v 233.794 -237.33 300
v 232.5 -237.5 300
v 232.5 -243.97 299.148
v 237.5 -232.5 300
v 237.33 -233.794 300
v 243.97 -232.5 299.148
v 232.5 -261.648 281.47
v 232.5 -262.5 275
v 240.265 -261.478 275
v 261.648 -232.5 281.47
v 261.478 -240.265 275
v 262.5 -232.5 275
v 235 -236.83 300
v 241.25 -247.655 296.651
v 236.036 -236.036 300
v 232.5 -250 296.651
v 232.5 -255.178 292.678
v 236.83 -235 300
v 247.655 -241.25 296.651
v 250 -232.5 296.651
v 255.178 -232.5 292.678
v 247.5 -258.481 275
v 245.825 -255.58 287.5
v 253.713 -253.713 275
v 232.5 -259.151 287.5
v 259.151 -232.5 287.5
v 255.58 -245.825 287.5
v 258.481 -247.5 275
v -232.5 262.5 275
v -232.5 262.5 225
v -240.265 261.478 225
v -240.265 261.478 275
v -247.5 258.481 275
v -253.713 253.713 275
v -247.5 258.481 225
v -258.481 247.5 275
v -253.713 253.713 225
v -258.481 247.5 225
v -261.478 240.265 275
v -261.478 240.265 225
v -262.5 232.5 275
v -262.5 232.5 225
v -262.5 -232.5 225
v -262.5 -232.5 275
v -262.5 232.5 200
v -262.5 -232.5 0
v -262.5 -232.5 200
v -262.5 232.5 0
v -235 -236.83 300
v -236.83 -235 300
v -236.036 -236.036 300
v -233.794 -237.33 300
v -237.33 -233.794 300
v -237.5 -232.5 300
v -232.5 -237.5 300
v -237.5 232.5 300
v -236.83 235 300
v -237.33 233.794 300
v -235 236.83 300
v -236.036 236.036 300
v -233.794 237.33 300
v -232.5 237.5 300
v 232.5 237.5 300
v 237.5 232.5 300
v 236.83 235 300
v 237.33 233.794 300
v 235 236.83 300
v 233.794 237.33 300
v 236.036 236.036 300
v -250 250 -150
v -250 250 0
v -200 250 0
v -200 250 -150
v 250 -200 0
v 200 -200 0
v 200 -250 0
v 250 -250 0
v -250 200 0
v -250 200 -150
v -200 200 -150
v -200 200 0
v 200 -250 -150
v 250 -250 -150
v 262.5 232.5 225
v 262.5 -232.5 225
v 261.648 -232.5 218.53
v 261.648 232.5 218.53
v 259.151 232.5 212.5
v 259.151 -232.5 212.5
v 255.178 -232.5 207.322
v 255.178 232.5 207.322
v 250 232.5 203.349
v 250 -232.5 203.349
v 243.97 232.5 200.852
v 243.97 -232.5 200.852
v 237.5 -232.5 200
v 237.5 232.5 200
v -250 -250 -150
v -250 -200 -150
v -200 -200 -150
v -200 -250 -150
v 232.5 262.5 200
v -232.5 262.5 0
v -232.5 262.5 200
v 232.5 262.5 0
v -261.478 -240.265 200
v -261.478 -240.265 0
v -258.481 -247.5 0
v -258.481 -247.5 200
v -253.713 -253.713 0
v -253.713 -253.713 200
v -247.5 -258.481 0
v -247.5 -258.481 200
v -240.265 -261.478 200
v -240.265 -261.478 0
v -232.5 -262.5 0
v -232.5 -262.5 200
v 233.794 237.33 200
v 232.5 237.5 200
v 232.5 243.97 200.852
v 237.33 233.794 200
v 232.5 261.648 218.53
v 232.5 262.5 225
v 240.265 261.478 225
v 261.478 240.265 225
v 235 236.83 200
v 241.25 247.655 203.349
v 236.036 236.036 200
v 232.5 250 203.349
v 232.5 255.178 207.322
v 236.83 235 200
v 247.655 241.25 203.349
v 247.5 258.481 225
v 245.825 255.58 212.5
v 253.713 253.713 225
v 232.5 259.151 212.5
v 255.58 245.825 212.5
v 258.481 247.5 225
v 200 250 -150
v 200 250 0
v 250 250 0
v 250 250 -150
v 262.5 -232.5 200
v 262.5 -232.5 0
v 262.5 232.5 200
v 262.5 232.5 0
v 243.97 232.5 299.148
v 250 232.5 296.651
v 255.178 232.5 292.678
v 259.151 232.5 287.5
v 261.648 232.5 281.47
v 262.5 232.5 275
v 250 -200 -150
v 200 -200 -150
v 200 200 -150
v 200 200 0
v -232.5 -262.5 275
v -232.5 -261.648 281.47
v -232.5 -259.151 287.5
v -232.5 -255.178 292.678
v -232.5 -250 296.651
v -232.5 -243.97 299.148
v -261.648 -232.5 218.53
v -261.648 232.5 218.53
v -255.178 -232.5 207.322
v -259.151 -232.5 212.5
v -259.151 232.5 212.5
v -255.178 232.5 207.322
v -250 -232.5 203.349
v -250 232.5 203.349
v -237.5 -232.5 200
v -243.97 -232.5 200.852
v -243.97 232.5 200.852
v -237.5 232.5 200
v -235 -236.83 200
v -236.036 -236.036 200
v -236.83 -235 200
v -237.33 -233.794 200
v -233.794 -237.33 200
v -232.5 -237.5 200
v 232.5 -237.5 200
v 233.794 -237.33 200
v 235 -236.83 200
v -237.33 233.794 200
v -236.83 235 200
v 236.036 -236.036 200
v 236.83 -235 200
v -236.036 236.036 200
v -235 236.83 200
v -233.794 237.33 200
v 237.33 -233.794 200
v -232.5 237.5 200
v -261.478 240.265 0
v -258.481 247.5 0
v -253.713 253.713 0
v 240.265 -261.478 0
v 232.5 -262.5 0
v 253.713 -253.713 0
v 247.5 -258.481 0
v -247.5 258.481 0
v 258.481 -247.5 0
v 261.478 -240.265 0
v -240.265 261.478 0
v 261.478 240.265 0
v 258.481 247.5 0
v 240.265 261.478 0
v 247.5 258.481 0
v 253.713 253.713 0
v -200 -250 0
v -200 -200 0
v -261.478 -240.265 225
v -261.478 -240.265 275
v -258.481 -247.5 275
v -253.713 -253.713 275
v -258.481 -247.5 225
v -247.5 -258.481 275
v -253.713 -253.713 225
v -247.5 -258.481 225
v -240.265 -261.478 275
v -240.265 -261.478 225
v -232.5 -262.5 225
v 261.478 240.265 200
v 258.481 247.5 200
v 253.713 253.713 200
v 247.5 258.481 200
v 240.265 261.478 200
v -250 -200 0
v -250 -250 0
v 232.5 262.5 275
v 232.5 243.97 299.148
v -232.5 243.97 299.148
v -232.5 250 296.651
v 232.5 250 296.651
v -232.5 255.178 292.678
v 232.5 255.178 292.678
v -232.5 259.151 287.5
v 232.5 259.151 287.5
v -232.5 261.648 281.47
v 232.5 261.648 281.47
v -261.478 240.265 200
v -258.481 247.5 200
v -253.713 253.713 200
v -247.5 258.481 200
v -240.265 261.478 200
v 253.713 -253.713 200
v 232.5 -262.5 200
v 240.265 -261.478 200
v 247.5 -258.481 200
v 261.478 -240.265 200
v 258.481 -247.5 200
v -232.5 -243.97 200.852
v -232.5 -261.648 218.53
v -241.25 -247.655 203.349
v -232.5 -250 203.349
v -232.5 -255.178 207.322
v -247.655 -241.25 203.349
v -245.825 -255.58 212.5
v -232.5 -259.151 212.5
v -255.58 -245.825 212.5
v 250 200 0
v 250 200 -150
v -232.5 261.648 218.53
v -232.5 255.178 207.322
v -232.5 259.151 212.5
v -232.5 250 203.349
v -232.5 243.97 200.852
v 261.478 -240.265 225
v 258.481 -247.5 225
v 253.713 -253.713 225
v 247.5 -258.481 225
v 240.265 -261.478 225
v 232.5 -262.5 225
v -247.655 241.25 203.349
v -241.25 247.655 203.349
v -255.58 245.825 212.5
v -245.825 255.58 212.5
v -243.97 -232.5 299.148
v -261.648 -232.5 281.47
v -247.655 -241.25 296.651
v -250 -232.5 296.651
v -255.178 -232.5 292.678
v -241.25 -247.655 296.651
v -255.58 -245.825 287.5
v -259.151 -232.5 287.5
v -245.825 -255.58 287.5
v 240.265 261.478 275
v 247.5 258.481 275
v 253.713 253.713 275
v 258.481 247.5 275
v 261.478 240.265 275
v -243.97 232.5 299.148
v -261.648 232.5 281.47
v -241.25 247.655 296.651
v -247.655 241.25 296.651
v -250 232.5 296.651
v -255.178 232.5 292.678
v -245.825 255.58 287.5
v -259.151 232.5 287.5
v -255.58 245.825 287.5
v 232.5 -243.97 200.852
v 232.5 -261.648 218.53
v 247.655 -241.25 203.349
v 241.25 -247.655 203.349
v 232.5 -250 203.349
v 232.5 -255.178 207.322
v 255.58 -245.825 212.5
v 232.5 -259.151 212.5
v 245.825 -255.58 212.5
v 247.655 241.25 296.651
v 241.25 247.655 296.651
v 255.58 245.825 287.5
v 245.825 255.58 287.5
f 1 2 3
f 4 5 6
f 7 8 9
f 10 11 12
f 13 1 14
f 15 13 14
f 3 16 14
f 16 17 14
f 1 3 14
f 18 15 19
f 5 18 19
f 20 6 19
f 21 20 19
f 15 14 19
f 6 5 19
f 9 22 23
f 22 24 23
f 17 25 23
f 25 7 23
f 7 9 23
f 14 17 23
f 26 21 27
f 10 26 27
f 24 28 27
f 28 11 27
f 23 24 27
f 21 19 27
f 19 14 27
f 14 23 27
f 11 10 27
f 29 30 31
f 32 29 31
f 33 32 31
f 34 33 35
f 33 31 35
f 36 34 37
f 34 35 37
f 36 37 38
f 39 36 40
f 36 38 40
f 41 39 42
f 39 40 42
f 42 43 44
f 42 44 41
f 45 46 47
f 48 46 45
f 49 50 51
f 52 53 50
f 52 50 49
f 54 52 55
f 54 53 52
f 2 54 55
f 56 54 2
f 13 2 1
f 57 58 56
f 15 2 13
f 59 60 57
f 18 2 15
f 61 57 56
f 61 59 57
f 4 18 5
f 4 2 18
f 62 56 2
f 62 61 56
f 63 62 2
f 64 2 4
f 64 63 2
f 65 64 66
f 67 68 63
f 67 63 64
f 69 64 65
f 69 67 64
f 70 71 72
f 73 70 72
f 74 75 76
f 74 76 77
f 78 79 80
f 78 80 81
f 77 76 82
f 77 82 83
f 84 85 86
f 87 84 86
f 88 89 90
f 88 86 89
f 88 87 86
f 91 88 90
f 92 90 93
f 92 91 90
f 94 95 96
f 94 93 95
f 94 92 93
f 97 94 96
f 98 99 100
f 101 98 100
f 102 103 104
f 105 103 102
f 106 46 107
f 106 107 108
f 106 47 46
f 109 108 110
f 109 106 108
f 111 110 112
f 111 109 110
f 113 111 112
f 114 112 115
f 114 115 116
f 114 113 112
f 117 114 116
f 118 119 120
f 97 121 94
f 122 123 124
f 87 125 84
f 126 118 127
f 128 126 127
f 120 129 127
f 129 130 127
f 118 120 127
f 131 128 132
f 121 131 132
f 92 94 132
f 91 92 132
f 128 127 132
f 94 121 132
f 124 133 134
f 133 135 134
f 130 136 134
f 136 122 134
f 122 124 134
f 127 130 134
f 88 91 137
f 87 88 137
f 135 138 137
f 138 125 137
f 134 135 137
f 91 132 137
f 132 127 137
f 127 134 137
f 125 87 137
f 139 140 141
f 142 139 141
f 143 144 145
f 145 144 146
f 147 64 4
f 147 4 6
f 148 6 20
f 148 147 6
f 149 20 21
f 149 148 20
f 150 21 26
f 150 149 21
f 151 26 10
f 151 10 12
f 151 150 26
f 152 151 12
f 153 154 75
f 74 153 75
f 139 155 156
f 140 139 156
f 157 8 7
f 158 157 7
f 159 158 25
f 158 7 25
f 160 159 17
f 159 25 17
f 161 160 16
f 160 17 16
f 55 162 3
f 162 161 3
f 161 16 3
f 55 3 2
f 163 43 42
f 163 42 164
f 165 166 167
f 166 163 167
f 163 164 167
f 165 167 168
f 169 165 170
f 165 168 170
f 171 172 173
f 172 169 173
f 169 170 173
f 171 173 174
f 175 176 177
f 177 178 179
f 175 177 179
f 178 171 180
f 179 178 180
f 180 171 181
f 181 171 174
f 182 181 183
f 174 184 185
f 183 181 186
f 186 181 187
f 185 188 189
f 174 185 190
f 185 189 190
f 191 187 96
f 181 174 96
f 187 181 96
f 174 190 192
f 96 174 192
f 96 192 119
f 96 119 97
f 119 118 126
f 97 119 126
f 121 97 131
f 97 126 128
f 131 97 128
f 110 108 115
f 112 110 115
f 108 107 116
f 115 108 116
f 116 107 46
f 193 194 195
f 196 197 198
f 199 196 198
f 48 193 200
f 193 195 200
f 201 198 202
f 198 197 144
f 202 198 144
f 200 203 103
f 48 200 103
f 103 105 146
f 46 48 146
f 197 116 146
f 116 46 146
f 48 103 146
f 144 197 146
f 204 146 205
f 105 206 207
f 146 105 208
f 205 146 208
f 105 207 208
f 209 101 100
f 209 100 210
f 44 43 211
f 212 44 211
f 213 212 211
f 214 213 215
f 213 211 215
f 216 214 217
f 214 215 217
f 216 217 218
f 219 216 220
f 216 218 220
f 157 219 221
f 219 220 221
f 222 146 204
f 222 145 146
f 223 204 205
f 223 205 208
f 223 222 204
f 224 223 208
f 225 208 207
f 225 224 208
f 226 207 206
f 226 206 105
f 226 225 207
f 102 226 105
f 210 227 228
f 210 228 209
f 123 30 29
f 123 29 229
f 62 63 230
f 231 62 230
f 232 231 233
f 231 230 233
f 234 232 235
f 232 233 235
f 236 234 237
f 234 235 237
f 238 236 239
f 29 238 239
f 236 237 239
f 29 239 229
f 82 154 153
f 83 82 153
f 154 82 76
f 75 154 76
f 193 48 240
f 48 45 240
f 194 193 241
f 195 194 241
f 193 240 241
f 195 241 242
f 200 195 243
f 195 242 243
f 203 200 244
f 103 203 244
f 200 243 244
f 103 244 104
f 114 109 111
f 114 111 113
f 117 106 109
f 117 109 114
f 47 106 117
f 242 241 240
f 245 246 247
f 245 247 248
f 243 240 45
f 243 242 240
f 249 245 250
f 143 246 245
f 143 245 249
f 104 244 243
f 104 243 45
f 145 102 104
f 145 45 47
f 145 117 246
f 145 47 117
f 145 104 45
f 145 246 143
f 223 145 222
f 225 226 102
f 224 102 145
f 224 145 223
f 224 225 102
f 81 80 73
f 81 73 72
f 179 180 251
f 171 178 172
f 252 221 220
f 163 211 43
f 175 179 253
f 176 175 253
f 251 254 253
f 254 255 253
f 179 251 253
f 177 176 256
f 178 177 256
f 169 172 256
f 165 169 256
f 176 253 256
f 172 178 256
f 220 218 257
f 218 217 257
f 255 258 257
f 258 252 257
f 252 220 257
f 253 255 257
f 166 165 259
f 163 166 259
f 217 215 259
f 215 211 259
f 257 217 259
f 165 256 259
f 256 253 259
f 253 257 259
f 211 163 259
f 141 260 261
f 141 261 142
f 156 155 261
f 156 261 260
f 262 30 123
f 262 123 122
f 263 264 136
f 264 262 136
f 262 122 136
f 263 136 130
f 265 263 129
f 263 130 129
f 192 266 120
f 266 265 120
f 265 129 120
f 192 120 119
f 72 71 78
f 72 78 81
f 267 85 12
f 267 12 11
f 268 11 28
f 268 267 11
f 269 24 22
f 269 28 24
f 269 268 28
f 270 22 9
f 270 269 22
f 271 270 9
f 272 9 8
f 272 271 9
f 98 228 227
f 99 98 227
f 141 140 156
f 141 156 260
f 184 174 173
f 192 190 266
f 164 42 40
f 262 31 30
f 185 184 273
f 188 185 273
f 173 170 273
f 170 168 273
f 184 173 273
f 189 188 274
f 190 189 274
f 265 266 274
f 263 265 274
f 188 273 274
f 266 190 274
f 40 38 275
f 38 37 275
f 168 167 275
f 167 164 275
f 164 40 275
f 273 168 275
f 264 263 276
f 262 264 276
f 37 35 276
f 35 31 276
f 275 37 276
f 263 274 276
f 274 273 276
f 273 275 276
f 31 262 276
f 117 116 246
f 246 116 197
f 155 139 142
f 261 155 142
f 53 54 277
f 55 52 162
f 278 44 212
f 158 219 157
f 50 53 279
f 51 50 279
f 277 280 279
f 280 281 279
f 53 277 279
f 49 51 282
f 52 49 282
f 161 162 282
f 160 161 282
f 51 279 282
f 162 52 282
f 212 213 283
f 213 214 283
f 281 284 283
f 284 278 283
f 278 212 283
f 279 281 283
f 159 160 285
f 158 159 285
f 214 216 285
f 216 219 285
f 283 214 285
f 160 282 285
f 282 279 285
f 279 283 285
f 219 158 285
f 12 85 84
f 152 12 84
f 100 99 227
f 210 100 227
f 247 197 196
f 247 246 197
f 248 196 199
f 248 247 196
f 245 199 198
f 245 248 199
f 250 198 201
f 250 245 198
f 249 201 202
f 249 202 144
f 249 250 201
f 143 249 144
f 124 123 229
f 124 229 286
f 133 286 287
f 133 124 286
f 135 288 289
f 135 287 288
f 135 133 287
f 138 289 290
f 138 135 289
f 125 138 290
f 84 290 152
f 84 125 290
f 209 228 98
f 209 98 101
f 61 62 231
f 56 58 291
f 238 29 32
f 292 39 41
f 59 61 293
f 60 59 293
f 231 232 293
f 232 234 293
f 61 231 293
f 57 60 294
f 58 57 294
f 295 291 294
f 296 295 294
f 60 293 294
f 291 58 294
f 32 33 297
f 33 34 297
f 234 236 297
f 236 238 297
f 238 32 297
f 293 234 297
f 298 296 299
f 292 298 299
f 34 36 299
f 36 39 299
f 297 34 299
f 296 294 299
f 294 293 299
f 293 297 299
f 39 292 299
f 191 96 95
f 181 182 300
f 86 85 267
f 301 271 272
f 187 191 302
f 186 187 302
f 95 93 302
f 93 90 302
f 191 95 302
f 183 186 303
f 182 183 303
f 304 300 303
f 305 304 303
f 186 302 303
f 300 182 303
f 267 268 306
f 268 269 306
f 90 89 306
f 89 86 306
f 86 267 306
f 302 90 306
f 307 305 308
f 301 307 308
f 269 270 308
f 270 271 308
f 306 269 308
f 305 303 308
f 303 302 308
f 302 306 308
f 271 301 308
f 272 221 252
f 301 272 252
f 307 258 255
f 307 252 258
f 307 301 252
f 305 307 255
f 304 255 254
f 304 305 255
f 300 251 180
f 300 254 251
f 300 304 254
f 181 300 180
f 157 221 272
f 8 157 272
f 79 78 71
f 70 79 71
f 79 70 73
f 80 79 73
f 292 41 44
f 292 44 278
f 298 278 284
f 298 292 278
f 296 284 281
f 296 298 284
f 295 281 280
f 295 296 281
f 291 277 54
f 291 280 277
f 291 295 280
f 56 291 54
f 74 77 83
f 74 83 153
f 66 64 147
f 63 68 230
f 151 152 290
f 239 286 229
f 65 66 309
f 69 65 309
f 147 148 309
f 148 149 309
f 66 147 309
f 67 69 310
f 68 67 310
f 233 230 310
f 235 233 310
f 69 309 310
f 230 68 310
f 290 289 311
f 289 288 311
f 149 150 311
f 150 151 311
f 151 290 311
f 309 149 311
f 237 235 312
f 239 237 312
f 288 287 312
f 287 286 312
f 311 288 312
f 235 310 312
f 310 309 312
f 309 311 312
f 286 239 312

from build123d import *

# Parameters (mm, degrees)
F0_W          = 500
F0_H          = 500
F1_DEPTH      = 150
F2_W          = 400
F2_H          = 150
F3_DEPTH      = 500.001
F4_W          = 400
F4_H          = 150
F5_DEPTH      = 500.001
F6_W          = 400
F6_H          = 150
F7_DEPTH      = 500.001
F8_W          = 525
F8_H          = 525
F9_DEPTH      = 200
F11_W         = 525
F11_H         = 525
F12_DEPTH     = 100
F13_R         = 25
F14_R         = 25
F15_T1_DEPTH  = 100
F15_T4_ANGLE  = 90
F15_T6_ANGLE  = 90
F15_T8_ANGLE  = 90
F15_T10_ANGLE = 90
F15_T12_ANGLE = 90
F15_T14_ANGLE = 90
F15_T16_ANGLE = 90
F15_T18_ANGLE = 90
F15_2_F1_R    = 30
F15_2_F2_R    = 30
F15_2_F3_R    = 30
F15_2_F4_R    = 30


# Not quite as in the source:
# - a fillet or chamfer that OpenCascade refuses, or shapes differently, is made with other operations: its cross-section is extruded or revolved along the edge and cut away or added


with BuildPart() as f1:
    # F0 (on Top) → F1 (new body)
    with BuildSketch(Plane.XY):
        Rectangle(F0_W, F0_H)
    extrude(amount=-F1_DEPTH)

    # F2 (on face) → F3 (cut, through all)
    with BuildSketch(Plane.XZ.offset(250)):
        with Locations((0, -75)):
            Rectangle(F2_W, F2_H)
    extrude(amount=-F3_DEPTH, mode=Mode.SUBTRACT)

    # F4 (on face) → F5 (cut, through all)
    with BuildSketch(Plane(origin=(-250, 0, 0), x_dir=(0, -1, 0), z_dir=(-1, 0, 0))):
        with Locations((0, -75)):
            Rectangle(F4_W, F4_H)
    extrude(amount=-F5_DEPTH, mode=Mode.SUBTRACT)

    # F6 (on face) → F7 (cut, through all)
    with BuildSketch(Plane.YZ.offset(250)):
        with Locations((0, -75)):
            Rectangle(F6_W, F6_H)
    extrude(amount=-F7_DEPTH, mode=Mode.SUBTRACT)


with BuildPart() as f9:
    # F8 (on Top) → F9 (new body)
    with BuildSketch(Plane.XY):
        Rectangle(F8_W, F8_H)
    extrude(amount=F9_DEPTH)

    # F15#2: fillet of radius 30 on 4 edges, made by hand

    # F15_2_f1
    f15_2_f1_edges = [f9.edges().sort_by_distance(p)[0] for p in [
        (-262.5, 262.5, 100),
    ]]
    fillet(f15_2_f1_edges, radius=F15_2_F1_R)

    # F15_2_f2
    f15_2_f2_edges = [f9.edges().sort_by_distance(p)[0] for p in [
        (-262.5, -262.5, 100),
    ]]
    fillet(f15_2_f2_edges, radius=F15_2_F2_R)

    # F15_2_f3
    f15_2_f3_edges = [f9.edges().sort_by_distance(p)[0] for p in [
        (262.5, -262.5, 100),
    ]]
    fillet(f15_2_f3_edges, radius=F15_2_F3_R)

    # F15_2_f4
    f15_2_f4_edges = [f9.edges().sort_by_distance(p)[0] for p in [
        (262.5, 262.5, 100),
    ]]
    fillet(f15_2_f4_edges, radius=F15_2_F4_R)


with BuildPart() as f12:
    # F11 (on face) → F12 (new body)
    with BuildSketch(Plane.XY.offset(200)):
        Rectangle(F11_W, F11_H)
    extrude(amount=F12_DEPTH)

    # F13
    f13_edges = [f12.edges().sort_by_distance(p)[0] for p in [
        (0, 262.5, 200),
        (262.5, 0, 200),
        (-262.5, 0, 200),
        (0, -262.5, 200),
    ]]
    fillet(f13_edges, radius=F13_R)

    # F14
    f14_edges = [f12.edges().sort_by_distance(p)[0] for p in [
        (0, 262.5, 300),
        (262.5, 0, 300),
        (-262.5, 0, 300),
        (0, -262.5, 300),
    ]]
    fillet(f14_edges, radius=F14_R)

    # F15: fillet of radius 30 on 4 edges, made by hand

    # F15_s2 → F15_t1 (cut)
    with BuildSketch(Plane.XY.offset(200)):
        with BuildLine():
            ThreePointArc((-232.5, 262.5), (-253.7132034356, 253.7132034356), (-262.5, 232.5))
            Line((-262.5, 232.5), (-262.5, 262.5))
            Line((-262.5, 262.5), (-232.5, 262.5))
        make_face()
        with BuildLine():
            ThreePointArc((232.5, 262.5), (253.7132034356, 253.7132034356), (262.5, 232.5))
            Line((262.5, 232.5), (262.5, 262.5))
            Line((262.5, 262.5), (232.5, 262.5))
        make_face()
        with BuildLine():
            ThreePointArc((262.5, -232.5), (253.7132034356, -253.7132034356), (232.5, -262.5))
            Line((232.5, -262.5), (262.5, -262.5))
            Line((262.5, -262.5), (262.5, -232.5))
        make_face()
        with BuildLine():
            ThreePointArc((-262.5, -232.5), (-253.7132034356, -253.7132034356), (-232.5, -262.5))
            Line((-232.5, -262.5), (-262.5, -262.5))
            Line((-262.5, -262.5), (-262.5, -232.5))
        make_face()
    extrude(amount=F15_T1_DEPTH, mode=Mode.SUBTRACT)

    # F15_s3 → F15_t4 (revolve, cut)
    with BuildSketch(Plane.YZ.offset(-232.5)):
        with BuildLine():
            ThreePointArc((-237.5, 200), (-255.1776695297, 207.3223304703), (-262.5, 225))
            Line((-262.5, 225), (-262.5, 200))
            Line((-262.5, 200), (-237.5, 200))
        make_face()
    revolve(axis=Axis((-232.5, -232.5, 200), (0, 0, -1)), revolution_arc=F15_T4_ANGLE, mode=Mode.SUBTRACT)

    # F15_s5 → F15_t6 (revolve, cut)
    with BuildSketch(Plane.XZ.offset(232.5)):
        with BuildLine():
            ThreePointArc((-237.5, 300), (-255.1776695297, 292.6776695297), (-262.5, 275))
            Line((-262.5, 275), (-262.5, 300))
            Line((-262.5, 300), (-237.5, 300))
        make_face()
    revolve(axis=Axis((-232.5, -232.5, 300), (0, 0, 1)), revolution_arc=F15_T6_ANGLE, mode=Mode.SUBTRACT)

    # F15_s7 → F15_t8 (revolve, cut)
    with BuildSketch(Plane.XZ.offset(232.5)):
        with BuildLine():
            ThreePointArc((237.5, 200), (255.1776695297, 207.3223304703), (262.5, 225))
            Line((262.5, 225), (262.5, 200))
            Line((262.5, 200), (237.5, 200))
        make_face()
    revolve(axis=Axis((232.5, -232.5, 200), (0, 0, -1)), revolution_arc=F15_T8_ANGLE, mode=Mode.SUBTRACT)

    # F15_s9 → F15_t10 (revolve, cut)
    with BuildSketch(Plane.YZ.offset(232.5)):
        with BuildLine():
            ThreePointArc((-237.5, 300), (-255.1776695297, 292.6776695297), (-262.5, 275))
            Line((-262.5, 275), (-262.5, 300))
            Line((-262.5, 300), (-237.5, 300))
        make_face()
    revolve(axis=Axis((232.5, -232.5, 300), (0, 0, 1)), revolution_arc=F15_T10_ANGLE, mode=Mode.SUBTRACT)

    # F15_s11 → F15_t12 (revolve, cut)
    with BuildSketch(Plane.YZ.offset(232.5)):
        with BuildLine():
            ThreePointArc((237.5, 200), (255.1776695297, 207.3223304703), (262.5, 225))
            Line((262.5, 225), (262.5, 200))
            Line((262.5, 200), (237.5, 200))
        make_face()
    revolve(axis=Axis((232.5, 232.5, 200), (0, 0, -1)), revolution_arc=F15_T12_ANGLE, mode=Mode.SUBTRACT)

    # F15_s13 → F15_t14 (revolve, cut)
    with BuildSketch(Plane.XZ.offset(-232.5)):
        with BuildLine():
            ThreePointArc((237.5, 300), (255.1776695297, 292.6776695297), (262.5, 275))
            Line((262.5, 275), (262.5, 300))
            Line((262.5, 300), (237.5, 300))
        make_face()
    revolve(axis=Axis((232.5, 232.5, 300), (0, 0, 1)), revolution_arc=F15_T14_ANGLE, mode=Mode.SUBTRACT)

    # F15_s15 → F15_t16 (revolve, cut)
    with BuildSketch(Plane.XZ.offset(-232.5)):
        with BuildLine():
            ThreePointArc((-237.5, 200), (-255.1776695297, 207.3223304703), (-262.5, 225))
            Line((-262.5, 225), (-262.5, 200))
            Line((-262.5, 200), (-237.5, 200))
        make_face()
    revolve(axis=Axis((-232.5, 232.5, 200), (0, 0, -1)), revolution_arc=F15_T16_ANGLE, mode=Mode.SUBTRACT)

    # F15_s17 → F15_t18 (revolve, cut)
    with BuildSketch(Plane.YZ.offset(-232.5)):
        with BuildLine():
            ThreePointArc((237.5, 300), (255.1776695297, 292.6776695297), (262.5, 275))
            Line((262.5, 275), (262.5, 300))
            Line((262.5, 300), (237.5, 300))
        make_face()
    revolve(axis=Axis((-232.5, 232.5, 300), (0, 0, 1)), revolution_arc=F15_T18_ANGLE, mode=Mode.SUBTRACT)


solid = Compound([f1.part, f9.part, f12.part])
